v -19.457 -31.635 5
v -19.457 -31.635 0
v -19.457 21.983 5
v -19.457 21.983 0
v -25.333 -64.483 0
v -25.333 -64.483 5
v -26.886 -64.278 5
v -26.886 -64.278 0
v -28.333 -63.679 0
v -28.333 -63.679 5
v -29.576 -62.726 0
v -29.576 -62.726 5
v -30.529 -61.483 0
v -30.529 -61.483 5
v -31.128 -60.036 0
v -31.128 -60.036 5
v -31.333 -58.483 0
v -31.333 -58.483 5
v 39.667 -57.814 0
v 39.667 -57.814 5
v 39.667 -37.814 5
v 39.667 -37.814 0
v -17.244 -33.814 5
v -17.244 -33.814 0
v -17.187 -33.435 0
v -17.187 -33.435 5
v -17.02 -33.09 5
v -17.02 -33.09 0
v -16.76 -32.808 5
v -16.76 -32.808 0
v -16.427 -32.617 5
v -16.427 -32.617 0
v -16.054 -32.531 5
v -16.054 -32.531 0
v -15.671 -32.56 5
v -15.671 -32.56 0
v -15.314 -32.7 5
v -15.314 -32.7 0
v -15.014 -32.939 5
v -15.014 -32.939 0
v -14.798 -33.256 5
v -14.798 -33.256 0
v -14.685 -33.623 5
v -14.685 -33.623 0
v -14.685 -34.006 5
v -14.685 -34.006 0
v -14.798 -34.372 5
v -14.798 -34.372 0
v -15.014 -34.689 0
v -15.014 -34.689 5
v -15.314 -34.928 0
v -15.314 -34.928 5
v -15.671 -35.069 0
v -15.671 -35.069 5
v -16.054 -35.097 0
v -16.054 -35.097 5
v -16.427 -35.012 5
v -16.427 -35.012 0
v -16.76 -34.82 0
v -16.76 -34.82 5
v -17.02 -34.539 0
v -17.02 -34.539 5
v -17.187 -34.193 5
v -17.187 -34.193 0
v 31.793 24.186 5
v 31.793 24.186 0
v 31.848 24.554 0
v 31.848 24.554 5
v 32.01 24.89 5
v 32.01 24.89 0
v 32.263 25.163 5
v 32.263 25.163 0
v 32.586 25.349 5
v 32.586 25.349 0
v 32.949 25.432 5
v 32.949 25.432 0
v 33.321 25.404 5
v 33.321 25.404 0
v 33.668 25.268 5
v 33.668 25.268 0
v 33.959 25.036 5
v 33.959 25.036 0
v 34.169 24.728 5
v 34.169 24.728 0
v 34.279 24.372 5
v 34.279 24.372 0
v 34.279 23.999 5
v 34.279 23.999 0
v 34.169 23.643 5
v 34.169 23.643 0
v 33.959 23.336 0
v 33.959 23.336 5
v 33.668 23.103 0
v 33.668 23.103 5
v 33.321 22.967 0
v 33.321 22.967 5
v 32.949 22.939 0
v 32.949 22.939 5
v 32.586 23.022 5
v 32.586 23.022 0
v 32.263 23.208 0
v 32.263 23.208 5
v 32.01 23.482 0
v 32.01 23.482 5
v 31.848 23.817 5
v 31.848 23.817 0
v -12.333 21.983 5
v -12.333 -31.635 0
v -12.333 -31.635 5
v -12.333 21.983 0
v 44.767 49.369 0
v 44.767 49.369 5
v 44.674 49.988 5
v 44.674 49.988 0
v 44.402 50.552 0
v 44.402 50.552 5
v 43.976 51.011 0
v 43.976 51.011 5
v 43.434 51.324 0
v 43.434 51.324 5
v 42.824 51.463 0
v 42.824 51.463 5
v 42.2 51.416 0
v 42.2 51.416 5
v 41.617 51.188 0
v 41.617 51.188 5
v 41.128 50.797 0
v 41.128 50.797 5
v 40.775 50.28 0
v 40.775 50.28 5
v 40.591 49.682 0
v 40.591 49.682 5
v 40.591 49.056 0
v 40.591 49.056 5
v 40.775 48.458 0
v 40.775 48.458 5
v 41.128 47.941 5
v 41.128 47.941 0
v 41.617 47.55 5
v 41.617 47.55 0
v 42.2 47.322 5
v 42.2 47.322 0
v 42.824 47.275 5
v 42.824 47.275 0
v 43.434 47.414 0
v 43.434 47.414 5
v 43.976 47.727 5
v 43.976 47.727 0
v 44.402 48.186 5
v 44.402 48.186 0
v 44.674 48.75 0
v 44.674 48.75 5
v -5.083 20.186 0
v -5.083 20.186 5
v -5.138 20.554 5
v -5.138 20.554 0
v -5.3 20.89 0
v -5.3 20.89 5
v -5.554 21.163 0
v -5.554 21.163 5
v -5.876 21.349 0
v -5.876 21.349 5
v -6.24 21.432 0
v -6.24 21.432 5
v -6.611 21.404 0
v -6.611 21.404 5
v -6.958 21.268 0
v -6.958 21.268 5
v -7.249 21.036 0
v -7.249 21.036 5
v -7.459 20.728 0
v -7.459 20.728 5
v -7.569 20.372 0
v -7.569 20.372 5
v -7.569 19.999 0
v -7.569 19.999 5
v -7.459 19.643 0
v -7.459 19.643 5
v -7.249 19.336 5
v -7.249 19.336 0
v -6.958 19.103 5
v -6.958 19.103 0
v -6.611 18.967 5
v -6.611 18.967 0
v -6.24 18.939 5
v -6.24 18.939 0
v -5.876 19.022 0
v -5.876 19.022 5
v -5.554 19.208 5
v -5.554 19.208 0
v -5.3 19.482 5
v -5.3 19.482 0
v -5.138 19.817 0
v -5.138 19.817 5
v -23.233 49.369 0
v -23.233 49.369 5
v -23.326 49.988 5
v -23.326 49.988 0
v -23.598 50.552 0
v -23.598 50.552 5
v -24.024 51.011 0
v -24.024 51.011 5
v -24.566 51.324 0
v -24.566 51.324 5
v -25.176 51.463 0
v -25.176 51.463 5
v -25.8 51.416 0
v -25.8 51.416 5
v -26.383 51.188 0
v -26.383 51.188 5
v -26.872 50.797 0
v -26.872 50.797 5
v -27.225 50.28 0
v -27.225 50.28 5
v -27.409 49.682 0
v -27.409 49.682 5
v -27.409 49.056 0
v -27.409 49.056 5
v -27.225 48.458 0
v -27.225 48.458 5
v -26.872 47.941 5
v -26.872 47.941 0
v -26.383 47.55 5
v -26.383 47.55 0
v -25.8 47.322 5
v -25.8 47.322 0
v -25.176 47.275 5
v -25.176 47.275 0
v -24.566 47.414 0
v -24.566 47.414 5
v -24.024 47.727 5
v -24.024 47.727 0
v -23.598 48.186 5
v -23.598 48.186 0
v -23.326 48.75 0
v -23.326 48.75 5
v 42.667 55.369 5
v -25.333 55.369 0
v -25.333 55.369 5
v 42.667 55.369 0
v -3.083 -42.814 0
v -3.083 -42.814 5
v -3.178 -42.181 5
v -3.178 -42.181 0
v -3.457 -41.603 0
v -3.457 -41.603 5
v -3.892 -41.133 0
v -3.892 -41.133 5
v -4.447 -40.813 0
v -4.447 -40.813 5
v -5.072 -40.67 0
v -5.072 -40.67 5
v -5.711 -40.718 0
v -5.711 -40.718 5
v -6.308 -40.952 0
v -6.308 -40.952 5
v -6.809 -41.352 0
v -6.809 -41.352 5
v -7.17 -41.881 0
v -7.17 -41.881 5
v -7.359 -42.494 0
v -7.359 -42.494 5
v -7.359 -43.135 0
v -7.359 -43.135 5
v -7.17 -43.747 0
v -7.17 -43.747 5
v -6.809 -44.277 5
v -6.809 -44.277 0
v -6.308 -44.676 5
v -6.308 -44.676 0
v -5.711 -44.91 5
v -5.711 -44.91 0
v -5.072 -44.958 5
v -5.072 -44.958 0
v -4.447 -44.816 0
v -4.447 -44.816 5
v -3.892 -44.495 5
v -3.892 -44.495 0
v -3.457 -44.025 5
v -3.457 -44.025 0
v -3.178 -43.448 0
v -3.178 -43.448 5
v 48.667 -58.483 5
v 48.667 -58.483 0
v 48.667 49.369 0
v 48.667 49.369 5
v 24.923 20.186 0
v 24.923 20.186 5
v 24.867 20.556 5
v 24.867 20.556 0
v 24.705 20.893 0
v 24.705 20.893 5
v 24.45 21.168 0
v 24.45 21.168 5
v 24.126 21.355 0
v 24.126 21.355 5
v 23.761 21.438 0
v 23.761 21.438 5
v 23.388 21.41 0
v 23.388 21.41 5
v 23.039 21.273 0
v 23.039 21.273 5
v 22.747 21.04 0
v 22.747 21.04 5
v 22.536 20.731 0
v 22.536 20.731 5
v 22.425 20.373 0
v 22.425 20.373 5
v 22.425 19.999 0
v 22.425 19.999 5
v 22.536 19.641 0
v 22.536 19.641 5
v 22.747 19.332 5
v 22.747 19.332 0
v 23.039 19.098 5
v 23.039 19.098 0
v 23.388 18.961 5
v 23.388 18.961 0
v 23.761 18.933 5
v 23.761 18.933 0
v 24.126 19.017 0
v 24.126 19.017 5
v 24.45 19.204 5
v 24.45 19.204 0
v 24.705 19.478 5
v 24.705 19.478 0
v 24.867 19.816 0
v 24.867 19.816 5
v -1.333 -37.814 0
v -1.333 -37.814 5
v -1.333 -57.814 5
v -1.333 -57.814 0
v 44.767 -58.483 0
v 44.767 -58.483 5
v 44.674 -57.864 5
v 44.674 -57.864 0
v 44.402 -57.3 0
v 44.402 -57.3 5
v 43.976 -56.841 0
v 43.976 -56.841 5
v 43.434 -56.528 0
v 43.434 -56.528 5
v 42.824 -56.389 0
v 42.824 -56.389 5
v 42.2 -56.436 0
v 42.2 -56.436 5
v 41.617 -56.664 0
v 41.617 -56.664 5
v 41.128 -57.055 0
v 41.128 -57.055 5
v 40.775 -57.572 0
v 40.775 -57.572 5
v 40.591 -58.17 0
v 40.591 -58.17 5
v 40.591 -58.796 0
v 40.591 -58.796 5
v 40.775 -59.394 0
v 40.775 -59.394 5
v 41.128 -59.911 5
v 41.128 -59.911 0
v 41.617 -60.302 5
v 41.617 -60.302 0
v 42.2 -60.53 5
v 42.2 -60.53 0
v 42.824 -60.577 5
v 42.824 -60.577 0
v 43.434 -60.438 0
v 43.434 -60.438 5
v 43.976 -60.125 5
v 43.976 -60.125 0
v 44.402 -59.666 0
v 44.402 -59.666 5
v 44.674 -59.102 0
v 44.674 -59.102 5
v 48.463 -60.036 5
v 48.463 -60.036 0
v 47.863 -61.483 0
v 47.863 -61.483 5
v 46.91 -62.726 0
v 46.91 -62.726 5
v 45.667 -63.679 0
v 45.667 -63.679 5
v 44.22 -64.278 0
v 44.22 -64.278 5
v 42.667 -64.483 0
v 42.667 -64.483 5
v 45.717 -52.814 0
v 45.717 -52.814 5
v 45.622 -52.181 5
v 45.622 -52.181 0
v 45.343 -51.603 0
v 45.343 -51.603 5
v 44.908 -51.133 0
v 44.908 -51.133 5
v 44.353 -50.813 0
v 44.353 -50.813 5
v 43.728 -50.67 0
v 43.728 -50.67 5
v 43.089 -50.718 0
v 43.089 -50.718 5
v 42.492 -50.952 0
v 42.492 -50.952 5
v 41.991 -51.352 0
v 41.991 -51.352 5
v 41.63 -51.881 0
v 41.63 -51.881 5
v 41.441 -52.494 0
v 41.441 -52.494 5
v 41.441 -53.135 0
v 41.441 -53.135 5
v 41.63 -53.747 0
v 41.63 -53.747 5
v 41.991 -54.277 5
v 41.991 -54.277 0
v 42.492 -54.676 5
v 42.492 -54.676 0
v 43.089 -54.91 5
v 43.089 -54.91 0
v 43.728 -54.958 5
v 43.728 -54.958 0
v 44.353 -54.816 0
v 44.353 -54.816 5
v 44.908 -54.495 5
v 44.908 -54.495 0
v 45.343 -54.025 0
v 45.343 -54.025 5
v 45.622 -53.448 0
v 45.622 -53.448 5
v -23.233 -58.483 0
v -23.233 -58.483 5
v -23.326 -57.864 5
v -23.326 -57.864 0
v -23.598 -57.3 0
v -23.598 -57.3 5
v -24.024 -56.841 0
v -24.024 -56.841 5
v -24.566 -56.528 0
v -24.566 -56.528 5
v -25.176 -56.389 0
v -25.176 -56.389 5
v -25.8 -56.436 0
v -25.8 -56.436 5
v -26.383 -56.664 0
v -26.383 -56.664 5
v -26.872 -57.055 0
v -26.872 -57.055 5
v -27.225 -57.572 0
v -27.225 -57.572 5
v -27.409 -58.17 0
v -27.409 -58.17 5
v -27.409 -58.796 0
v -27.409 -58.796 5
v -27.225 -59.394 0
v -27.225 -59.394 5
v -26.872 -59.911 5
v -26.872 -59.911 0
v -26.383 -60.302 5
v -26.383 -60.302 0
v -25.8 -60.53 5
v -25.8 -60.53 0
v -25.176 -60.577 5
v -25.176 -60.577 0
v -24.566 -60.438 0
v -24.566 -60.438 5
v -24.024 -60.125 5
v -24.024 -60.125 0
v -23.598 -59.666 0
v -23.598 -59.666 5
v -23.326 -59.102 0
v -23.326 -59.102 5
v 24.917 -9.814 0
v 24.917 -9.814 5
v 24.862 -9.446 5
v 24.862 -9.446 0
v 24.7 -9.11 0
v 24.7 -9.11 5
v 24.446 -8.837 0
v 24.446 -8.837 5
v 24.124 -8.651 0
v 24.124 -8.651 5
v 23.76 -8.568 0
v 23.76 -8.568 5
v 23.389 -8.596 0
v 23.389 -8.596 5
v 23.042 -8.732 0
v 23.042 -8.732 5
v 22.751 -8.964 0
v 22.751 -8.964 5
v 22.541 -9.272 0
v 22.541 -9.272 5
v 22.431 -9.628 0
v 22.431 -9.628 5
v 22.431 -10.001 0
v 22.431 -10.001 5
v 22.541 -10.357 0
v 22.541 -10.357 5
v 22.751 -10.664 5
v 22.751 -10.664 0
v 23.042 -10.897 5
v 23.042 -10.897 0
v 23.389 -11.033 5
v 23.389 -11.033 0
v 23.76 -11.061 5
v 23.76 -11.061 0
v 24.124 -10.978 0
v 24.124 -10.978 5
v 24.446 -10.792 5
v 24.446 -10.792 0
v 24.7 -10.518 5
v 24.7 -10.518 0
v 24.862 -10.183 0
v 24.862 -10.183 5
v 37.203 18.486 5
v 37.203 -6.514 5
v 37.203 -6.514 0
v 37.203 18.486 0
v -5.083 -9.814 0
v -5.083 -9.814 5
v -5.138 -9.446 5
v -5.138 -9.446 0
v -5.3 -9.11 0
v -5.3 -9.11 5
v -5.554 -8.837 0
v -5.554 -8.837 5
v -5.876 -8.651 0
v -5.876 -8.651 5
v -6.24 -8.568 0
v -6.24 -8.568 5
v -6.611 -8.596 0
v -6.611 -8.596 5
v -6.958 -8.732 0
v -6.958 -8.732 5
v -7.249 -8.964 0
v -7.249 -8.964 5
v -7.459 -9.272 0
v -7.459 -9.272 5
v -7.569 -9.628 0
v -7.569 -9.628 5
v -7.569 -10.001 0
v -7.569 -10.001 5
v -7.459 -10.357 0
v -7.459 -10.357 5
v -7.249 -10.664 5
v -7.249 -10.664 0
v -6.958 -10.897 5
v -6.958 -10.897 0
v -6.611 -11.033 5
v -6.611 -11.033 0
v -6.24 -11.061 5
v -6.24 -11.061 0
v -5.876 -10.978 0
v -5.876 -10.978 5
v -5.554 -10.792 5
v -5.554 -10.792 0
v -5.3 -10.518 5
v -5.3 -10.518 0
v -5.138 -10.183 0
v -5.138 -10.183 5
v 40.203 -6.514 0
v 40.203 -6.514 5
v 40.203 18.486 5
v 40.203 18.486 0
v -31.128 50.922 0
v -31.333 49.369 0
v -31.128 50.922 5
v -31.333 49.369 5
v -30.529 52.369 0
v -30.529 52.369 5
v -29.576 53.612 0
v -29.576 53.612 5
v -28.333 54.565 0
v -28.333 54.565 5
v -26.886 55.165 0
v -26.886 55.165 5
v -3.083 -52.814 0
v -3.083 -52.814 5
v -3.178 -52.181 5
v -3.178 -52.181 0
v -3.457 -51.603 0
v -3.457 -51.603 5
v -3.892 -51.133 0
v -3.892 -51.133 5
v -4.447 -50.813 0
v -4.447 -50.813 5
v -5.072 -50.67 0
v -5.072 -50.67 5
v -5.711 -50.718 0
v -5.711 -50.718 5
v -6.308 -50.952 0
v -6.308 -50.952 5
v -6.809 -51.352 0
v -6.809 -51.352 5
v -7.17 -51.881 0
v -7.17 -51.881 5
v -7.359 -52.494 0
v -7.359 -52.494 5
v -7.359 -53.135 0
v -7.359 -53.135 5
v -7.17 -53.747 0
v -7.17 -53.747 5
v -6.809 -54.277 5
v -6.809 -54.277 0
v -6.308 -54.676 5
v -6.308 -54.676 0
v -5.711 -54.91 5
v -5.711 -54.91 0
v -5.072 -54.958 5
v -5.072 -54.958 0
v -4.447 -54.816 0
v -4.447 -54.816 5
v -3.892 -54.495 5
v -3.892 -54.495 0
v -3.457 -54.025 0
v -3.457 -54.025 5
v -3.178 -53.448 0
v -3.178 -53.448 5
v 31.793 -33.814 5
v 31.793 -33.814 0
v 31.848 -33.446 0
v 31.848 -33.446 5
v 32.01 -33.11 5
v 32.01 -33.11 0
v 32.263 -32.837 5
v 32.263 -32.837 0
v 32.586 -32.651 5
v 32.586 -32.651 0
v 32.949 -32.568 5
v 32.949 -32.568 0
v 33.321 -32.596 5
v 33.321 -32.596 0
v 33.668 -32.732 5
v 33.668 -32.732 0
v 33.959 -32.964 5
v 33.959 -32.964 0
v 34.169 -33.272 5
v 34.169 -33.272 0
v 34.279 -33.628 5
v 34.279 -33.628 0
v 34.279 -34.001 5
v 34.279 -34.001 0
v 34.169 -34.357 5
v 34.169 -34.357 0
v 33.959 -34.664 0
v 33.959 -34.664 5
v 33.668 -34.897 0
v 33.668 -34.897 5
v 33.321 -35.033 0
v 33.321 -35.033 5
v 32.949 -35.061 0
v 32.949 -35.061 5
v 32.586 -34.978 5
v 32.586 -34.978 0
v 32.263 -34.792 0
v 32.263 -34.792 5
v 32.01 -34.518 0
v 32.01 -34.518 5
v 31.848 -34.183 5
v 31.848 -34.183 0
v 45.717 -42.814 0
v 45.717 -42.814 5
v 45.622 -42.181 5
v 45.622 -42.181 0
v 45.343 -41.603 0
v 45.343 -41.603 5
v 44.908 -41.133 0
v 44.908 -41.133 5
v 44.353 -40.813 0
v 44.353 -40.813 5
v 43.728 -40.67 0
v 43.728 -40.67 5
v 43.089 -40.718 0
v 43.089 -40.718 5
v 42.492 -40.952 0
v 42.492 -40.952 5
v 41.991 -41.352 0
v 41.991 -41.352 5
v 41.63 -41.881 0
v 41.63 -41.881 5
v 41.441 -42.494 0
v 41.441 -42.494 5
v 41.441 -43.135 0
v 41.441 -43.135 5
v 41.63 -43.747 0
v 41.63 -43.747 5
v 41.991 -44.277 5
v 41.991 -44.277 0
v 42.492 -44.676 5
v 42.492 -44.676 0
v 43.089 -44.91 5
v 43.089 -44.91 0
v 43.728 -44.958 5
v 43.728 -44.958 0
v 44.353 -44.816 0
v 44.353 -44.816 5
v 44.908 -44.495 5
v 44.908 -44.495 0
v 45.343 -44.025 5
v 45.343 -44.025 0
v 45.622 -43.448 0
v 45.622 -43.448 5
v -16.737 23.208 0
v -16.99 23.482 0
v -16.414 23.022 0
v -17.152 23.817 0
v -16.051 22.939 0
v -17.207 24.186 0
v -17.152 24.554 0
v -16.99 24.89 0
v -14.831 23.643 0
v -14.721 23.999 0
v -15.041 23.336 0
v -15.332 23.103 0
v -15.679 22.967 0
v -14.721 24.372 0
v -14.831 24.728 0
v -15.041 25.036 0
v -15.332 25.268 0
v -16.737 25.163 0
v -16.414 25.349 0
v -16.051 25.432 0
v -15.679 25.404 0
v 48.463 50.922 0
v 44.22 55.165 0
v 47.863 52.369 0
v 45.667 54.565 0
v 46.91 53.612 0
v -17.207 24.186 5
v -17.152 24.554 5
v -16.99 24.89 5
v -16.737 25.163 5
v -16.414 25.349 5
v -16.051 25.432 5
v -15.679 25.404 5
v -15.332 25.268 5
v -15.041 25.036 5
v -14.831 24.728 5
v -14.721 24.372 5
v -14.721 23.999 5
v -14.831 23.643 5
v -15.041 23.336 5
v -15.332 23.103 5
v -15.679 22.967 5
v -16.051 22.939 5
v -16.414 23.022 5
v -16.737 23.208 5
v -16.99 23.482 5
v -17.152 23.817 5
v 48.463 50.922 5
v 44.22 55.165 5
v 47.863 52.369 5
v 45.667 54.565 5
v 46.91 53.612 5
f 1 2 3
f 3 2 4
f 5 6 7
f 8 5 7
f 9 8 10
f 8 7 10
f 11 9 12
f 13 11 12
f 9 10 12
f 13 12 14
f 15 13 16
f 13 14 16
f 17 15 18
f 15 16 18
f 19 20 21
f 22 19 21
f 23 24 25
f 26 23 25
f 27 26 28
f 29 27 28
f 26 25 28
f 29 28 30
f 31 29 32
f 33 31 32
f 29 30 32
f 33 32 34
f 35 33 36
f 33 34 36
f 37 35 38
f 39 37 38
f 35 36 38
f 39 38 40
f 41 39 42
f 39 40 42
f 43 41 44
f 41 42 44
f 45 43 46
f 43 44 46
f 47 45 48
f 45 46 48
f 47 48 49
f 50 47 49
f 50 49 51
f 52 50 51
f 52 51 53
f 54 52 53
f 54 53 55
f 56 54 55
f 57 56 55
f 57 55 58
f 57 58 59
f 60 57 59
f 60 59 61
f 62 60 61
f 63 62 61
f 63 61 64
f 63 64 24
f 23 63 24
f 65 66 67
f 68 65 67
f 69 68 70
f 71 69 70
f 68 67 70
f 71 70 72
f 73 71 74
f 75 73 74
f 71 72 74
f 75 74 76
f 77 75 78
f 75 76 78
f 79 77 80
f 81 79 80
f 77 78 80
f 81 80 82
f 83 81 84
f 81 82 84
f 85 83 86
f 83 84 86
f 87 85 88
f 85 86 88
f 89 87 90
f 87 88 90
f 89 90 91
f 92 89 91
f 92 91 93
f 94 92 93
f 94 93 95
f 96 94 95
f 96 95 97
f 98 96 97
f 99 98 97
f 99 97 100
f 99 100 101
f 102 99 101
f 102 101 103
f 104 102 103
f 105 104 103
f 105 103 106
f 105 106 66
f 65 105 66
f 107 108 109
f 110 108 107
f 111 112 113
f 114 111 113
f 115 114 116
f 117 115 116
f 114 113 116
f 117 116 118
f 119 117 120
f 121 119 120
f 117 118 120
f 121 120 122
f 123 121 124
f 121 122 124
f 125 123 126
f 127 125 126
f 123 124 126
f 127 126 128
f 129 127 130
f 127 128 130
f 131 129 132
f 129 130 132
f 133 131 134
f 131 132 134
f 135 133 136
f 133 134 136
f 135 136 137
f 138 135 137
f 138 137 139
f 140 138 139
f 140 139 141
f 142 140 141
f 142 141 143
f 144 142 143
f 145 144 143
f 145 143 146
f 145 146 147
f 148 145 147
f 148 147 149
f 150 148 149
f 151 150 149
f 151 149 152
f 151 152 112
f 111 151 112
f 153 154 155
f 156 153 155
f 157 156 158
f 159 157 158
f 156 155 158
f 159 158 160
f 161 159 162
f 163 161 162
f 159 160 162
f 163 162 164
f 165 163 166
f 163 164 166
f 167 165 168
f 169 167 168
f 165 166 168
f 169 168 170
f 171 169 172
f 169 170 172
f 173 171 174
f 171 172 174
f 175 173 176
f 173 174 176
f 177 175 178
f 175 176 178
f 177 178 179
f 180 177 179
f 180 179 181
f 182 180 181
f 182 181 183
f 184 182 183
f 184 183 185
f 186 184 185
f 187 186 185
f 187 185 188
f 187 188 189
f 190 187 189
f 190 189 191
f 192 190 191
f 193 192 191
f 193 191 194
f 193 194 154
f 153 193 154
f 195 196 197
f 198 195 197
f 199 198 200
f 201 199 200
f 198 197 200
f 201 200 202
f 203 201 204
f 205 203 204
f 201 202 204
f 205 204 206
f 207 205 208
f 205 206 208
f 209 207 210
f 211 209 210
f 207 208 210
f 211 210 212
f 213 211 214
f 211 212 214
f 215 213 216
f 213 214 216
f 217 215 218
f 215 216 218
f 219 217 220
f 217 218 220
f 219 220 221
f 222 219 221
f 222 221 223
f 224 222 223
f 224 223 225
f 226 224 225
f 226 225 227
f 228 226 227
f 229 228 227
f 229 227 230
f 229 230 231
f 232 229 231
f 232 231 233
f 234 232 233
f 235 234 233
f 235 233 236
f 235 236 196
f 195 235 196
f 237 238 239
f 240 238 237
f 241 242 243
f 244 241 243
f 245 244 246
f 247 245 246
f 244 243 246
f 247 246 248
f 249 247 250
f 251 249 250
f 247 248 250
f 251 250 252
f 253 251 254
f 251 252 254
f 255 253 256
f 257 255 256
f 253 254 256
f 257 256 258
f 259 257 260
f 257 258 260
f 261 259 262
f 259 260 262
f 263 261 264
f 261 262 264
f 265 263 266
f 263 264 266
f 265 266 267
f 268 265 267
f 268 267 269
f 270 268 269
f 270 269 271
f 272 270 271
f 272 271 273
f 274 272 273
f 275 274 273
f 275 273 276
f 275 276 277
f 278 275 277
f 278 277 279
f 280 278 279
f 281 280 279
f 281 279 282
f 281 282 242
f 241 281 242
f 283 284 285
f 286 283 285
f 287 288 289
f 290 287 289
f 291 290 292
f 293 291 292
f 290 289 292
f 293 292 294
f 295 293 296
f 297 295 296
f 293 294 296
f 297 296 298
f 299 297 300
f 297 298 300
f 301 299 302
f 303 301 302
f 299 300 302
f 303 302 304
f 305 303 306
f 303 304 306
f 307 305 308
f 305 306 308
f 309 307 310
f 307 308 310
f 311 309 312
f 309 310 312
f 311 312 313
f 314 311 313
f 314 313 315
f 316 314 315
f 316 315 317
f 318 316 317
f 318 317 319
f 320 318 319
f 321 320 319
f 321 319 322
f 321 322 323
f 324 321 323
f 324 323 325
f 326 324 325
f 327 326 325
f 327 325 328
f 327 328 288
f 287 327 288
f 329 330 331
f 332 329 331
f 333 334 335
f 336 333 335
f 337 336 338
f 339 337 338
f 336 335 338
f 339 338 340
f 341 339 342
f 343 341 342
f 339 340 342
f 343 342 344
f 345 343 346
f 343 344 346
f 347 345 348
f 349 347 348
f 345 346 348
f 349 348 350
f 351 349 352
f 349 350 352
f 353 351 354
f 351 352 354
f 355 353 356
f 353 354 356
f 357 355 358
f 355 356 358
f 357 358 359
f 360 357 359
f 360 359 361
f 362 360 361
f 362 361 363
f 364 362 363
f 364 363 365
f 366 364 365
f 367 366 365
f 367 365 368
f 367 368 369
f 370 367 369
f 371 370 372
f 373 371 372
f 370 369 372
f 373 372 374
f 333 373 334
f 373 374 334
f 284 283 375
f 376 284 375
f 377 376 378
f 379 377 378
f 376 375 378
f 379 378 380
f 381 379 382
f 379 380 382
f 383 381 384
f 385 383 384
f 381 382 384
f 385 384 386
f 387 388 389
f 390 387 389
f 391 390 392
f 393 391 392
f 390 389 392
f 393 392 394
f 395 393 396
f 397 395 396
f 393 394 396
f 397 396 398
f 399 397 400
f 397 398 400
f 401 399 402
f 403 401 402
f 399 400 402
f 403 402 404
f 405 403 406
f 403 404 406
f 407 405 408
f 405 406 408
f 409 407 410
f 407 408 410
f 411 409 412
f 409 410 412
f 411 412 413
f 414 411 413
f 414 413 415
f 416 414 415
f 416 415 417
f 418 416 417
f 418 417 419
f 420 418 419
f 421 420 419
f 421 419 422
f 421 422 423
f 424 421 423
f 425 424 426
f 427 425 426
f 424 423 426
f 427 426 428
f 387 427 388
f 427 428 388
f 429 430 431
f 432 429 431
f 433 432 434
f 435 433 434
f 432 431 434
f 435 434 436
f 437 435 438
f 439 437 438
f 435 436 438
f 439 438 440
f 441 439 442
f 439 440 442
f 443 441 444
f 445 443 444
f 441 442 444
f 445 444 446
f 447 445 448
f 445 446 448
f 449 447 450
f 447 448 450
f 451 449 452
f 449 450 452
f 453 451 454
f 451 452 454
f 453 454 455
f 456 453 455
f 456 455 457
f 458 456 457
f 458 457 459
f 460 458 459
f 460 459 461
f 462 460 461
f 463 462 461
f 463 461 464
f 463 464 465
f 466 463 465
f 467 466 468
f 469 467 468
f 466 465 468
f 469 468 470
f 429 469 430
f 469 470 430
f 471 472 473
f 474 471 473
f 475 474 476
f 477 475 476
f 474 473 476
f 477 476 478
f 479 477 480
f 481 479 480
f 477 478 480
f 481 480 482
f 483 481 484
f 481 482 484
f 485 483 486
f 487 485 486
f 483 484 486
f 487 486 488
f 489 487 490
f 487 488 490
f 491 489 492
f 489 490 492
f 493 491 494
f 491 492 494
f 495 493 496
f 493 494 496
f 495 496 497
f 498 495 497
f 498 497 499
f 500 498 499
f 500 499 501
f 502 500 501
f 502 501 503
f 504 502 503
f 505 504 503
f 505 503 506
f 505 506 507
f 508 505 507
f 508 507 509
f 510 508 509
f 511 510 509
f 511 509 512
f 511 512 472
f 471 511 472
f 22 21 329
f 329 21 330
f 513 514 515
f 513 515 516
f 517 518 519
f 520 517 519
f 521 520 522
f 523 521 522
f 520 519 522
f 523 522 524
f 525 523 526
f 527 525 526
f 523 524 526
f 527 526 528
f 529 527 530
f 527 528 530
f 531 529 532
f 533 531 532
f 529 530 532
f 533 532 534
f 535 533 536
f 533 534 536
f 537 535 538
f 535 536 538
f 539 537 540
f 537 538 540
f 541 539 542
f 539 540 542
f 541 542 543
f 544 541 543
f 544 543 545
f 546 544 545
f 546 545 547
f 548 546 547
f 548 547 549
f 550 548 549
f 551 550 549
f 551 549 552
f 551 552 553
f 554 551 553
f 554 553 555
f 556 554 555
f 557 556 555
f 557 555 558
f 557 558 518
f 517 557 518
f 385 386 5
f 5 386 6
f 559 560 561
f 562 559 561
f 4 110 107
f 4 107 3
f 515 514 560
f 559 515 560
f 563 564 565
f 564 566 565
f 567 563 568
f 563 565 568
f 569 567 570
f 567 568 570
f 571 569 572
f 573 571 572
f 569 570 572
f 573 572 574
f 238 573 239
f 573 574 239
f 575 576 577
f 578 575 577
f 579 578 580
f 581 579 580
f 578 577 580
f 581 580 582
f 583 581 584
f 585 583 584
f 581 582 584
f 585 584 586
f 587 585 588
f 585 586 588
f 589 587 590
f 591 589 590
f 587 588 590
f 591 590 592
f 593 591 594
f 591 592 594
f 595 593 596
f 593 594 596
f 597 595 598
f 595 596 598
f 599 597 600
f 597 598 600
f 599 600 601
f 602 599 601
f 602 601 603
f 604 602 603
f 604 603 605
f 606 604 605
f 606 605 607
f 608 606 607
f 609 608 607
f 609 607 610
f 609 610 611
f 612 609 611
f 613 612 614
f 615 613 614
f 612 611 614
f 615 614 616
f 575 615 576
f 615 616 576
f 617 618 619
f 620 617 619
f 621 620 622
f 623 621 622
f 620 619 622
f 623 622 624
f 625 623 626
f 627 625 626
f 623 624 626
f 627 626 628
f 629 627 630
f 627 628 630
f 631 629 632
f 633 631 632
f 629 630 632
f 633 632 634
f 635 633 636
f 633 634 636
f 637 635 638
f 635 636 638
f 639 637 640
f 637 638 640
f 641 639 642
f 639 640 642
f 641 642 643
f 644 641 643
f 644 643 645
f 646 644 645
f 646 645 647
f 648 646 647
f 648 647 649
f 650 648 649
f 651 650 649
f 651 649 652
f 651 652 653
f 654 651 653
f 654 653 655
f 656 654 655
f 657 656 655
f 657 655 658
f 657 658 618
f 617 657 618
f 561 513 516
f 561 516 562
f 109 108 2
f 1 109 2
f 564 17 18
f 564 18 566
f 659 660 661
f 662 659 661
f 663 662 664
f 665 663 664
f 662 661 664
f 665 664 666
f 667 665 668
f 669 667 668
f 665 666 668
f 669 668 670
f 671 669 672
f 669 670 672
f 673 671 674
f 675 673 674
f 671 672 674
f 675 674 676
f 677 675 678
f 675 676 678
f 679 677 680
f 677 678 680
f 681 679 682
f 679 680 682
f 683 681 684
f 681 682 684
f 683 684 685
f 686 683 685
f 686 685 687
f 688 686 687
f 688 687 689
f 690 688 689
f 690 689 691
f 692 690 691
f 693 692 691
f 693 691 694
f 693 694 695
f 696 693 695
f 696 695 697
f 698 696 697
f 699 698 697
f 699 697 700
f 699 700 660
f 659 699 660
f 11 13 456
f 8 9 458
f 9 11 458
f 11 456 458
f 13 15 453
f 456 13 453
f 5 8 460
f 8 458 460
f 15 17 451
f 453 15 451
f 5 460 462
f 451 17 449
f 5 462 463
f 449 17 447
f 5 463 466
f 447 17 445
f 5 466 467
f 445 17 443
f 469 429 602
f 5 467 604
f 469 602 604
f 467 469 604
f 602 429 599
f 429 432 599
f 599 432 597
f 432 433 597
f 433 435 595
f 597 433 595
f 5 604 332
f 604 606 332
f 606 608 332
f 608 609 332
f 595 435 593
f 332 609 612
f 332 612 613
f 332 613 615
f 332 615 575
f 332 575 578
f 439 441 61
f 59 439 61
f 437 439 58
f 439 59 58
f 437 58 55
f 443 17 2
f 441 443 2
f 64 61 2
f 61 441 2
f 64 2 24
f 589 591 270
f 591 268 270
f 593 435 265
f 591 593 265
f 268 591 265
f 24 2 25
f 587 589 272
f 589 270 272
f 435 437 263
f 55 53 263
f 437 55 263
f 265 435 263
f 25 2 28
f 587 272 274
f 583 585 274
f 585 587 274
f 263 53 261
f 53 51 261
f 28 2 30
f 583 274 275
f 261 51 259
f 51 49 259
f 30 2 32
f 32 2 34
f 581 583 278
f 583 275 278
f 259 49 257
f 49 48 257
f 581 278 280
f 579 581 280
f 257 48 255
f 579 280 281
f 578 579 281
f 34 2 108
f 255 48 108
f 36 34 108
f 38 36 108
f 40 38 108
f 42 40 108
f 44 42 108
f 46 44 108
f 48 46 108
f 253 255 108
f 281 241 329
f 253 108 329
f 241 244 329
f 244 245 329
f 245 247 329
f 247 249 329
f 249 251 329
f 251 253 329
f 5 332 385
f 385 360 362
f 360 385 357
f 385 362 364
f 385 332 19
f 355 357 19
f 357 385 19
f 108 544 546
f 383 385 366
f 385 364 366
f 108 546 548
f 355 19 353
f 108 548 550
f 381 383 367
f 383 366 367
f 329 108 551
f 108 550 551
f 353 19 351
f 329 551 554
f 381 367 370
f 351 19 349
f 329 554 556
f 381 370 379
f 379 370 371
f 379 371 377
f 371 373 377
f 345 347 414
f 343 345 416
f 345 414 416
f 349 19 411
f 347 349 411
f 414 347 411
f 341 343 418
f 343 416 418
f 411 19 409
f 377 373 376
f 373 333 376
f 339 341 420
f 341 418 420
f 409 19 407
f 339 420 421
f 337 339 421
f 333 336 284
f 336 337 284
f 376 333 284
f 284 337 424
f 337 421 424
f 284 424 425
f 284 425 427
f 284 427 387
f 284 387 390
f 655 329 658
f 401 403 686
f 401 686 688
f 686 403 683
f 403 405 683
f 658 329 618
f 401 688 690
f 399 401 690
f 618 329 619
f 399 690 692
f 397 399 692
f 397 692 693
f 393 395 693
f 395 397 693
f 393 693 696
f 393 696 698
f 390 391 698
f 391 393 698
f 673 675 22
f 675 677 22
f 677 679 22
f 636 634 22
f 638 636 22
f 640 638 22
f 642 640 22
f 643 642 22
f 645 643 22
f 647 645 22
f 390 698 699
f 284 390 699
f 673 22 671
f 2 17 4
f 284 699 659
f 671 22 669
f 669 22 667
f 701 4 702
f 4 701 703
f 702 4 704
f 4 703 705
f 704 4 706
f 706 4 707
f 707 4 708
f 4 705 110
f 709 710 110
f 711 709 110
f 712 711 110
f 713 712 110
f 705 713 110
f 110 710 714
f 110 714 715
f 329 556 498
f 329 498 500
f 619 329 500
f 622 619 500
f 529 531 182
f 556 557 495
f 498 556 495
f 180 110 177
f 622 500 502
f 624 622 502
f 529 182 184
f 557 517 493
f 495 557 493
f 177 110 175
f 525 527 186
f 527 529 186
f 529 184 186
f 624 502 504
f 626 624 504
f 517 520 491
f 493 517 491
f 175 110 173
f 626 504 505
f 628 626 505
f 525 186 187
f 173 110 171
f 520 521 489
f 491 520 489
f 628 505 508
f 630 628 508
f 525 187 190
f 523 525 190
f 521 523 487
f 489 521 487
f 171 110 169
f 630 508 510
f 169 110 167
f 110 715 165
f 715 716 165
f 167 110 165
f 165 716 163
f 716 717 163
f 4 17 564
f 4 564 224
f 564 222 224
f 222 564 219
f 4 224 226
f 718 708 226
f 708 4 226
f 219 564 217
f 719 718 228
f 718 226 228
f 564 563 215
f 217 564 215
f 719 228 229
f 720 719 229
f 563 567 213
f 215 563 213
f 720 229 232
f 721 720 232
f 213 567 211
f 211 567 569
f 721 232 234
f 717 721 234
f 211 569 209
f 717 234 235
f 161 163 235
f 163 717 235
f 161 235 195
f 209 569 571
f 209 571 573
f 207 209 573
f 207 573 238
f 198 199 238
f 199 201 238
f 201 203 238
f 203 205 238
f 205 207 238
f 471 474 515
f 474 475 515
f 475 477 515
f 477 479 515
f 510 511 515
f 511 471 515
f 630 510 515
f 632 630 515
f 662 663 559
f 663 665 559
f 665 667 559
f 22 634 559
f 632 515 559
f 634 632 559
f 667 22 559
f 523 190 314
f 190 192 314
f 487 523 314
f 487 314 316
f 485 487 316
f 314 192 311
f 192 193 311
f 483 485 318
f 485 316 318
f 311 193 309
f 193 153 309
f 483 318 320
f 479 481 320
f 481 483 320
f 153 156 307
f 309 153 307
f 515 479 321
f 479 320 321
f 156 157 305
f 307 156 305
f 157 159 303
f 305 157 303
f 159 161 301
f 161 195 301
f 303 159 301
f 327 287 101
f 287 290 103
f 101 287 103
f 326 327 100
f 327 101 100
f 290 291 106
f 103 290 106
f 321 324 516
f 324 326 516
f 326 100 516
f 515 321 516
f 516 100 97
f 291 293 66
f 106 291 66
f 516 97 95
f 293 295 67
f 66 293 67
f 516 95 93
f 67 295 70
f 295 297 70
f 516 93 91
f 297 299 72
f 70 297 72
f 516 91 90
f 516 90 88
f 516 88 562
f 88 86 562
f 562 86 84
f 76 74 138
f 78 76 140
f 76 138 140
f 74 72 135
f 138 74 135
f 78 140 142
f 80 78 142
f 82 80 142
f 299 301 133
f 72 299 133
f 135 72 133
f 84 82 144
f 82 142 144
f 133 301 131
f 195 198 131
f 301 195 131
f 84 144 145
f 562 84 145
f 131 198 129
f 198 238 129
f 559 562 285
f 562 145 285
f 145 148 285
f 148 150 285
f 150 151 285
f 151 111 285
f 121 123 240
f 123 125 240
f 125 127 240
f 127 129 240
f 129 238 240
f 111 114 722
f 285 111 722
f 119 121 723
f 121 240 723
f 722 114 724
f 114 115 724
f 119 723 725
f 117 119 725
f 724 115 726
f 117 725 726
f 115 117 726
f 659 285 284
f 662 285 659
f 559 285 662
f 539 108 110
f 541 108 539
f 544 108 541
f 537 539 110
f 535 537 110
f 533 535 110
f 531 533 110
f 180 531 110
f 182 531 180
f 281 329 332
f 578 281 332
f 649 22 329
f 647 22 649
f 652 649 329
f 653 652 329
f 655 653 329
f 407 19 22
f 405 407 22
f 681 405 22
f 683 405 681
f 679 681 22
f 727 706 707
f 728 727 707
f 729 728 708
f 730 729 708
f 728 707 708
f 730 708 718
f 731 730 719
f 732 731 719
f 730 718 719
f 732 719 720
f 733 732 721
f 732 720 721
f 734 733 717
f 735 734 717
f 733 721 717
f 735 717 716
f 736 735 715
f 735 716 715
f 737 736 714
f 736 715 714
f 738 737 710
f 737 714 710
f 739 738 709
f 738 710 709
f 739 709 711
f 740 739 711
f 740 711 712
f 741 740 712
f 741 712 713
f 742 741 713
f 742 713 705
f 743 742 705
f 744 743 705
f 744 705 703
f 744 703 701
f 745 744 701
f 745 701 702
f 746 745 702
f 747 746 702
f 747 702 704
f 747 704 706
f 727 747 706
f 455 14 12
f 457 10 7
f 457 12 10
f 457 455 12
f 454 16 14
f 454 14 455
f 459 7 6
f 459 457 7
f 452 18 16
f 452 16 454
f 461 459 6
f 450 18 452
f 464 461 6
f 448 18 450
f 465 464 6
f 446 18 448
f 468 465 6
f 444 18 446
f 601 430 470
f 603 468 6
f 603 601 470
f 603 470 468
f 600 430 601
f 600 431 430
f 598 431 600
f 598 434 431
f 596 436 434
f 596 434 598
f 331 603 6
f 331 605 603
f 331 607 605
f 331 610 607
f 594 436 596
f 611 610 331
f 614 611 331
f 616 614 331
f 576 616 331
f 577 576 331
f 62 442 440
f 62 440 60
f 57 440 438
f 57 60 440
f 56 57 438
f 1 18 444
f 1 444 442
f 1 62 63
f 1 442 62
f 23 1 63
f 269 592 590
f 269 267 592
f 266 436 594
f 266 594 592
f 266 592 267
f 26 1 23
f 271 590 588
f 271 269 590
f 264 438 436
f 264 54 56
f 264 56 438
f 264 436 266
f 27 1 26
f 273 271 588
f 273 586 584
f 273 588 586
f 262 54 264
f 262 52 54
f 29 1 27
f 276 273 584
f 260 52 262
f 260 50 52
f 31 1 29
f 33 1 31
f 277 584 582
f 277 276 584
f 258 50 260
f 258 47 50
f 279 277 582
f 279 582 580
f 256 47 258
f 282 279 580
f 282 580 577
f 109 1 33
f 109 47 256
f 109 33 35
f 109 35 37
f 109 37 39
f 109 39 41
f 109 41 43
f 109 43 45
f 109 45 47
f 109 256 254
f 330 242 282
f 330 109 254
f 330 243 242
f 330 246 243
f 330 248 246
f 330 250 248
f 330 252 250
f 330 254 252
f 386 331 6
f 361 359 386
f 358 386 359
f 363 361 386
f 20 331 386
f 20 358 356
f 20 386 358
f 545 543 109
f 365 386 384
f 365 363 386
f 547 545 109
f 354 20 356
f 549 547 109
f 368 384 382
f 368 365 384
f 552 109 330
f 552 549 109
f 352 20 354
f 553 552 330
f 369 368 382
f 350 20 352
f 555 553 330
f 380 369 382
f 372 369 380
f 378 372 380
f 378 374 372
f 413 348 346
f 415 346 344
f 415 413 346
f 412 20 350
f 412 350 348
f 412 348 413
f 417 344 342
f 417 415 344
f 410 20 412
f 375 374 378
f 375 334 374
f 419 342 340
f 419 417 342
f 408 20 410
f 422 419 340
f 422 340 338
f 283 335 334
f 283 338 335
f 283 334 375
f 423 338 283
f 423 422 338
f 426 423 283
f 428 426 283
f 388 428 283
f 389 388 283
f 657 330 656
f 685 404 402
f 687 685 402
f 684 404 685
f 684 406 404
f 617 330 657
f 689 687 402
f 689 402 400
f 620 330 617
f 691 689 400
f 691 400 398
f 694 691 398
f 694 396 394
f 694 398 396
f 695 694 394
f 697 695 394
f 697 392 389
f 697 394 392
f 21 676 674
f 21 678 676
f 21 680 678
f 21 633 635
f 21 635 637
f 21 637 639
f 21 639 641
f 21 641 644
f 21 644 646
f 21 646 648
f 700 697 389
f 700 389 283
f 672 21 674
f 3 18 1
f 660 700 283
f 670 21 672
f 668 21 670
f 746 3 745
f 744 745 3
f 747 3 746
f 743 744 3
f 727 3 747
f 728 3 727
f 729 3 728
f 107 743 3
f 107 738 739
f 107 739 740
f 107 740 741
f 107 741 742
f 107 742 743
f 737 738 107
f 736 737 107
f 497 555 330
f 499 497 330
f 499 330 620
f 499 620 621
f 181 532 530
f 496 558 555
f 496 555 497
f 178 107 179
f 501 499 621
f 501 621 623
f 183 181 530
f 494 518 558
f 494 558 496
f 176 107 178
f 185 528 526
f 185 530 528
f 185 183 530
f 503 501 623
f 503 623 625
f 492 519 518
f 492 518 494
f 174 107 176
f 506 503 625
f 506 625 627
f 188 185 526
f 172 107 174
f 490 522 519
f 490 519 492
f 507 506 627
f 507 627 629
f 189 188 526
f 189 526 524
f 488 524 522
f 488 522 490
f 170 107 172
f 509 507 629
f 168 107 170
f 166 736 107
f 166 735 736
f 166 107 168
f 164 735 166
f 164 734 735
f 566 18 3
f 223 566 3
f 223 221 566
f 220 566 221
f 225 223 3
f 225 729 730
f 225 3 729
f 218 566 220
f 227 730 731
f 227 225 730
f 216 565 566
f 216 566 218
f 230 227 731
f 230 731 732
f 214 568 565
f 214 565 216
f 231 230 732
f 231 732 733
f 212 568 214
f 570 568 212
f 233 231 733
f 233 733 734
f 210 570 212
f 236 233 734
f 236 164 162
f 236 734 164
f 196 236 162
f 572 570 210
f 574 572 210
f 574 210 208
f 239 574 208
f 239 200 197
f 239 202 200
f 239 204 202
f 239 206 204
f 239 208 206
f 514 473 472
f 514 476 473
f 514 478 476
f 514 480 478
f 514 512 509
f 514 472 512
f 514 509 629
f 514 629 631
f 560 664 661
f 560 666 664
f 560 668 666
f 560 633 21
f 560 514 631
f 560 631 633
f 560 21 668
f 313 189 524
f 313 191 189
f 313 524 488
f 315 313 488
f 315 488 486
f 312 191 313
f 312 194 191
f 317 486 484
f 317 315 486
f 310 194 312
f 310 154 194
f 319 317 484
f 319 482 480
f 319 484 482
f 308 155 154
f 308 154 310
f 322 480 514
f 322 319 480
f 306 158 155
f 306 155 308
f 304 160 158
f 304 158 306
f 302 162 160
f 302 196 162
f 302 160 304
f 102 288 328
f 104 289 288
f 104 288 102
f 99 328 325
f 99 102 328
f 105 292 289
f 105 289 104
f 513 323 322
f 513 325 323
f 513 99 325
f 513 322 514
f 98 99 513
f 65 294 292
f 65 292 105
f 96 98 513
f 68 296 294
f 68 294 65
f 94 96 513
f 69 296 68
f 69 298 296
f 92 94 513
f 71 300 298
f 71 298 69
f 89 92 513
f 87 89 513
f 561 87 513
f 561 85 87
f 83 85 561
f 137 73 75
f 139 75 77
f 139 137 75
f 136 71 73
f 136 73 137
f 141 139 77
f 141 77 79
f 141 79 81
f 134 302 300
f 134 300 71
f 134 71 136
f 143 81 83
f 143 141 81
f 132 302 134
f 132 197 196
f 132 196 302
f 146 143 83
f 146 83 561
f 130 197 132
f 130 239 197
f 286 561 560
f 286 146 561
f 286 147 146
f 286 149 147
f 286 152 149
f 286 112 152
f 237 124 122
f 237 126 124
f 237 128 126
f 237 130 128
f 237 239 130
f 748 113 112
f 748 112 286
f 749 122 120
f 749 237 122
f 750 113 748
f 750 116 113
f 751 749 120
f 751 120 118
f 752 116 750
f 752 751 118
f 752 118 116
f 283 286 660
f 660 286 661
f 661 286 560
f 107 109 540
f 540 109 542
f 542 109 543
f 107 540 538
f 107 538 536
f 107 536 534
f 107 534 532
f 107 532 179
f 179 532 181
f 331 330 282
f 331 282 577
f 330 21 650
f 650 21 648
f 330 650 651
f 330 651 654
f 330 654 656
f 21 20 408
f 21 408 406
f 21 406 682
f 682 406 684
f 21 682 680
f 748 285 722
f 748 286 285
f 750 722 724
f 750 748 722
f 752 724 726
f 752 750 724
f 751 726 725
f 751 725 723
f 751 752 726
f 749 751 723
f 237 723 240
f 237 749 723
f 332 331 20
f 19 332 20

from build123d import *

# Parameters (mm, degrees)
IZIM1_W                              = 80
IZIM1_H                              = 100
Y_KSEKLIK_EKSTR_ZYON1_DEPTH          = 5
IZIM2_R                              = 1.25
IZIM2_R_2                            = 1.286520495
KES_EKSTR_ZYON1_DEPTH                = 10
M4_HELISARMAL_I_IN_Z_VANA_MATKAB_1_D = 4.2
RADYUS1_R                            = 6
RADYUS2_R                            = 6
RADYUS3_R                            = 6
RADYUS4_R                            = 6
IZIM4_W                              = 3
IZIM4_H                              = 25
IZIM4_R                              = 1.25
IZIM4_R_2                            = 1.255794896
KES_EKSTR_ZYON2_DEPTH                = 50
IZIM5_W                              = 7.124534101
IZIM5_H                              = 53.617419338
KES_EKSTR_ZYON3_DEPTH                = 50
IZIM6_R                              = 2.6
IZIM6_R_2                            = 2.15
IZIM6_R_3                            = 2.1
Y_KSEKLIK_EKSTR_ZYON2_DEPTH          = 5
IZIM7_R                              = 2.15
KES_EKSTR_ZYON4_DEPTH                = 5
KES_EKSTR_ZYON5_DEPTH                = 5


with BuildPart() as part:
    # Çizim1 → Yükseklik-Ekstrüzyon1 (new body)
    with BuildSketch(Plane.XY):
        with Locations((8.667082878, 5.369127517)):
            Rectangle(IZIM1_W, IZIM1_H)
    extrude(amount=Y_KSEKLIK_EKSTR_ZYON1_DEPTH)

    # Çizim2 → Kes-Ekstrüzyon1 (cut)
    with BuildSketch(Plane(origin=(0, 0, 0), x_dir=(-1, 0, 0), z_dir=(0, 0, -1))):
        with Locations((15.957451223, 24.185733017)):
            Circle(IZIM2_R)
        with Locations((-33.042548777, 24.185733017)):
            Circle(IZIM2_R)
        with Locations((-33.042548777, -33.814266983)):
            Circle(IZIM2_R)
        with Locations((15.957451223, -33.814266983)):
            Circle(IZIM2_R_2)
    extrude(amount=-KES_EKSTR_ZYON1_DEPTH, mode=Mode.SUBTRACT)

    # M4 Helisarmal için Zıvana matkabı1 (through all)
    with Locations(Plane(origin=(-25.332917122, -38.630872483, 0), x_dir=(-1, 0, 0), z_dir=(0, 0, -1))):
        with Locations((0, 0), (-68, 0), (0, 88), (-68, 88)):
            Hole(M4_HELISARMAL_I_IN_Z_VANA_MATKAB_1_D / 2)

    # Radyus1
    radyus1_edges = [part.edges().sort_by_distance(p)[0] for p in [
        (-31.332917122, 55.369127517, 2.5),
    ]]
    fillet(radyus1_edges, radius=RADYUS1_R)

    # Radyus2
    radyus2_edges = [part.edges().sort_by_distance(p)[0] for p in [
        (-31.332917122, -44.630872483, 2.5),
    ]]
    fillet(radyus2_edges, radius=RADYUS2_R)

    # Radyus3
    radyus3_edges = [part.edges().sort_by_distance(p)[0] for p in [
        (48.667082878, -44.630872483, 2.5),
    ]]
    fillet(radyus3_edges, radius=RADYUS3_R)

    # Radyus4
    radyus4_edges = [part.edges().sort_by_distance(p)[0] for p in [
        (48.667082878, 55.369127517, 2.5),
    ]]
    fillet(radyus4_edges, radius=RADYUS4_R)

    # Çizim4 → Kes-Ekstrüzyon2 (cut)
    with BuildSketch(Plane.XY.offset(5)):
        with Locations((38.703217921, 5.985733017)):
            Rectangle(IZIM4_W, IZIM4_H)
        with Locations((23.667082878, -9.814266983)):
            Circle(IZIM4_R)
        with Locations((23.667082878, 20.185733017)):
            Circle(IZIM4_R_2)
        with Locations((-6.332917122, 20.185733017)):
            Circle(IZIM4_R)
        with Locations((-6.332917122, -9.814266983)):
            Circle(IZIM4_R)
    extrude(amount=-KES_EKSTR_ZYON2_DEPTH, mode=Mode.SUBTRACT)

    # Çizim5 → Kes-Ekstrüzyon3 (cut)
    with BuildSketch(Plane(origin=(0, 0, 0), x_dir=(-1, 0, 0), z_dir=(0, 0, -1))):
        with Locations((15.895184173, -4.826044253)):
            Rectangle(IZIM5_W, IZIM5_H)
    extrude(amount=-KES_EKSTR_ZYON3_DEPTH, mode=Mode.SUBTRACT)

    # Çizim6 → Yükseklik-Ekstrüzyon2 (add)
    # profile 1 of 3: a face of its own
    with BuildSketch(Plane.XY.offset(5)):
        with Locations((-25.332917122, -38.630872483)):
            Circle(IZIM6_R)
    # profile 2 of 3: a face of its own
    with BuildSketch(Plane.XY.offset(5)):
        with Locations((42.667082878, -38.630872483)):
            Circle(IZIM6_R)
    # profile 3 of 3: a face of its own
    with BuildSketch(Plane.XY.offset(5)):
        with BuildLine():
            Line((-31.332917122, -38.630872483), (48.667082878, -38.630872483))
            Line((48.667082878, -38.630872483), (48.667082878, -58.482911504))
            ThreePointArc((48.667082878, -58.482911504), (46.909723565, -62.725552191), (42.667082878, -64.482911504))
            Line((42.667082878, -64.482911504), (-25.332917122, -64.482911504))
            ThreePointArc((-25.332917122, -64.482911504), (-29.575557809, -62.725552191), (-31.332917122, -58.482911504))
            Line((-31.332917122, -58.482911504), (-31.332917122, -38.630872483))
        make_face()
        with Locations((-5.232917122, -52.814266983)):
            Circle(IZIM6_R_2, mode=Mode.SUBTRACT)
        with Locations((-5.232917122, -42.814266983)):
            Circle(IZIM6_R_2, mode=Mode.SUBTRACT)
        with Locations((43.567082878, -42.814266983)):
            Circle(IZIM6_R_2, mode=Mode.SUBTRACT)
        with Locations((43.567082878, -52.814266983)):
            Circle(IZIM6_R_2, mode=Mode.SUBTRACT)
        with Locations((-25.332917122, -58.482911504)):
            Circle(IZIM6_R_3, mode=Mode.SUBTRACT)
        with Locations((42.667082878, -58.482911504)):
            Circle(IZIM6_R_3, mode=Mode.SUBTRACT)
    extrude(amount=-Y_KSEKLIK_EKSTR_ZYON2_DEPTH)

    # Çizim7 → Kes-Ekstrüzyon4 (cut)
    with BuildSketch(Plane.XY.offset(5)):
        with Locations((43.567082878, -42.814266983)):
            Circle(IZIM7_R)
        with Locations((-5.232917122, -42.814266983)):
            Circle(IZIM7_R)
    extrude(amount=-KES_EKSTR_ZYON4_DEPTH, mode=Mode.SUBTRACT)

    # Çizim8 → Kes-Ekstrüzyon5 (cut)
    with BuildSketch(Plane.XY.offset(5)):
        Polygon((-1.332917122, -37.814266983), (-1.332917122, -38.614266983), (-1.332917122, -57.814266983), (39.667082878, -57.814266983), (39.667082878, -37.814266983), align=None)
    extrude(amount=-KES_EKSTR_ZYON5_DEPTH, mode=Mode.SUBTRACT)


solid = part.part
